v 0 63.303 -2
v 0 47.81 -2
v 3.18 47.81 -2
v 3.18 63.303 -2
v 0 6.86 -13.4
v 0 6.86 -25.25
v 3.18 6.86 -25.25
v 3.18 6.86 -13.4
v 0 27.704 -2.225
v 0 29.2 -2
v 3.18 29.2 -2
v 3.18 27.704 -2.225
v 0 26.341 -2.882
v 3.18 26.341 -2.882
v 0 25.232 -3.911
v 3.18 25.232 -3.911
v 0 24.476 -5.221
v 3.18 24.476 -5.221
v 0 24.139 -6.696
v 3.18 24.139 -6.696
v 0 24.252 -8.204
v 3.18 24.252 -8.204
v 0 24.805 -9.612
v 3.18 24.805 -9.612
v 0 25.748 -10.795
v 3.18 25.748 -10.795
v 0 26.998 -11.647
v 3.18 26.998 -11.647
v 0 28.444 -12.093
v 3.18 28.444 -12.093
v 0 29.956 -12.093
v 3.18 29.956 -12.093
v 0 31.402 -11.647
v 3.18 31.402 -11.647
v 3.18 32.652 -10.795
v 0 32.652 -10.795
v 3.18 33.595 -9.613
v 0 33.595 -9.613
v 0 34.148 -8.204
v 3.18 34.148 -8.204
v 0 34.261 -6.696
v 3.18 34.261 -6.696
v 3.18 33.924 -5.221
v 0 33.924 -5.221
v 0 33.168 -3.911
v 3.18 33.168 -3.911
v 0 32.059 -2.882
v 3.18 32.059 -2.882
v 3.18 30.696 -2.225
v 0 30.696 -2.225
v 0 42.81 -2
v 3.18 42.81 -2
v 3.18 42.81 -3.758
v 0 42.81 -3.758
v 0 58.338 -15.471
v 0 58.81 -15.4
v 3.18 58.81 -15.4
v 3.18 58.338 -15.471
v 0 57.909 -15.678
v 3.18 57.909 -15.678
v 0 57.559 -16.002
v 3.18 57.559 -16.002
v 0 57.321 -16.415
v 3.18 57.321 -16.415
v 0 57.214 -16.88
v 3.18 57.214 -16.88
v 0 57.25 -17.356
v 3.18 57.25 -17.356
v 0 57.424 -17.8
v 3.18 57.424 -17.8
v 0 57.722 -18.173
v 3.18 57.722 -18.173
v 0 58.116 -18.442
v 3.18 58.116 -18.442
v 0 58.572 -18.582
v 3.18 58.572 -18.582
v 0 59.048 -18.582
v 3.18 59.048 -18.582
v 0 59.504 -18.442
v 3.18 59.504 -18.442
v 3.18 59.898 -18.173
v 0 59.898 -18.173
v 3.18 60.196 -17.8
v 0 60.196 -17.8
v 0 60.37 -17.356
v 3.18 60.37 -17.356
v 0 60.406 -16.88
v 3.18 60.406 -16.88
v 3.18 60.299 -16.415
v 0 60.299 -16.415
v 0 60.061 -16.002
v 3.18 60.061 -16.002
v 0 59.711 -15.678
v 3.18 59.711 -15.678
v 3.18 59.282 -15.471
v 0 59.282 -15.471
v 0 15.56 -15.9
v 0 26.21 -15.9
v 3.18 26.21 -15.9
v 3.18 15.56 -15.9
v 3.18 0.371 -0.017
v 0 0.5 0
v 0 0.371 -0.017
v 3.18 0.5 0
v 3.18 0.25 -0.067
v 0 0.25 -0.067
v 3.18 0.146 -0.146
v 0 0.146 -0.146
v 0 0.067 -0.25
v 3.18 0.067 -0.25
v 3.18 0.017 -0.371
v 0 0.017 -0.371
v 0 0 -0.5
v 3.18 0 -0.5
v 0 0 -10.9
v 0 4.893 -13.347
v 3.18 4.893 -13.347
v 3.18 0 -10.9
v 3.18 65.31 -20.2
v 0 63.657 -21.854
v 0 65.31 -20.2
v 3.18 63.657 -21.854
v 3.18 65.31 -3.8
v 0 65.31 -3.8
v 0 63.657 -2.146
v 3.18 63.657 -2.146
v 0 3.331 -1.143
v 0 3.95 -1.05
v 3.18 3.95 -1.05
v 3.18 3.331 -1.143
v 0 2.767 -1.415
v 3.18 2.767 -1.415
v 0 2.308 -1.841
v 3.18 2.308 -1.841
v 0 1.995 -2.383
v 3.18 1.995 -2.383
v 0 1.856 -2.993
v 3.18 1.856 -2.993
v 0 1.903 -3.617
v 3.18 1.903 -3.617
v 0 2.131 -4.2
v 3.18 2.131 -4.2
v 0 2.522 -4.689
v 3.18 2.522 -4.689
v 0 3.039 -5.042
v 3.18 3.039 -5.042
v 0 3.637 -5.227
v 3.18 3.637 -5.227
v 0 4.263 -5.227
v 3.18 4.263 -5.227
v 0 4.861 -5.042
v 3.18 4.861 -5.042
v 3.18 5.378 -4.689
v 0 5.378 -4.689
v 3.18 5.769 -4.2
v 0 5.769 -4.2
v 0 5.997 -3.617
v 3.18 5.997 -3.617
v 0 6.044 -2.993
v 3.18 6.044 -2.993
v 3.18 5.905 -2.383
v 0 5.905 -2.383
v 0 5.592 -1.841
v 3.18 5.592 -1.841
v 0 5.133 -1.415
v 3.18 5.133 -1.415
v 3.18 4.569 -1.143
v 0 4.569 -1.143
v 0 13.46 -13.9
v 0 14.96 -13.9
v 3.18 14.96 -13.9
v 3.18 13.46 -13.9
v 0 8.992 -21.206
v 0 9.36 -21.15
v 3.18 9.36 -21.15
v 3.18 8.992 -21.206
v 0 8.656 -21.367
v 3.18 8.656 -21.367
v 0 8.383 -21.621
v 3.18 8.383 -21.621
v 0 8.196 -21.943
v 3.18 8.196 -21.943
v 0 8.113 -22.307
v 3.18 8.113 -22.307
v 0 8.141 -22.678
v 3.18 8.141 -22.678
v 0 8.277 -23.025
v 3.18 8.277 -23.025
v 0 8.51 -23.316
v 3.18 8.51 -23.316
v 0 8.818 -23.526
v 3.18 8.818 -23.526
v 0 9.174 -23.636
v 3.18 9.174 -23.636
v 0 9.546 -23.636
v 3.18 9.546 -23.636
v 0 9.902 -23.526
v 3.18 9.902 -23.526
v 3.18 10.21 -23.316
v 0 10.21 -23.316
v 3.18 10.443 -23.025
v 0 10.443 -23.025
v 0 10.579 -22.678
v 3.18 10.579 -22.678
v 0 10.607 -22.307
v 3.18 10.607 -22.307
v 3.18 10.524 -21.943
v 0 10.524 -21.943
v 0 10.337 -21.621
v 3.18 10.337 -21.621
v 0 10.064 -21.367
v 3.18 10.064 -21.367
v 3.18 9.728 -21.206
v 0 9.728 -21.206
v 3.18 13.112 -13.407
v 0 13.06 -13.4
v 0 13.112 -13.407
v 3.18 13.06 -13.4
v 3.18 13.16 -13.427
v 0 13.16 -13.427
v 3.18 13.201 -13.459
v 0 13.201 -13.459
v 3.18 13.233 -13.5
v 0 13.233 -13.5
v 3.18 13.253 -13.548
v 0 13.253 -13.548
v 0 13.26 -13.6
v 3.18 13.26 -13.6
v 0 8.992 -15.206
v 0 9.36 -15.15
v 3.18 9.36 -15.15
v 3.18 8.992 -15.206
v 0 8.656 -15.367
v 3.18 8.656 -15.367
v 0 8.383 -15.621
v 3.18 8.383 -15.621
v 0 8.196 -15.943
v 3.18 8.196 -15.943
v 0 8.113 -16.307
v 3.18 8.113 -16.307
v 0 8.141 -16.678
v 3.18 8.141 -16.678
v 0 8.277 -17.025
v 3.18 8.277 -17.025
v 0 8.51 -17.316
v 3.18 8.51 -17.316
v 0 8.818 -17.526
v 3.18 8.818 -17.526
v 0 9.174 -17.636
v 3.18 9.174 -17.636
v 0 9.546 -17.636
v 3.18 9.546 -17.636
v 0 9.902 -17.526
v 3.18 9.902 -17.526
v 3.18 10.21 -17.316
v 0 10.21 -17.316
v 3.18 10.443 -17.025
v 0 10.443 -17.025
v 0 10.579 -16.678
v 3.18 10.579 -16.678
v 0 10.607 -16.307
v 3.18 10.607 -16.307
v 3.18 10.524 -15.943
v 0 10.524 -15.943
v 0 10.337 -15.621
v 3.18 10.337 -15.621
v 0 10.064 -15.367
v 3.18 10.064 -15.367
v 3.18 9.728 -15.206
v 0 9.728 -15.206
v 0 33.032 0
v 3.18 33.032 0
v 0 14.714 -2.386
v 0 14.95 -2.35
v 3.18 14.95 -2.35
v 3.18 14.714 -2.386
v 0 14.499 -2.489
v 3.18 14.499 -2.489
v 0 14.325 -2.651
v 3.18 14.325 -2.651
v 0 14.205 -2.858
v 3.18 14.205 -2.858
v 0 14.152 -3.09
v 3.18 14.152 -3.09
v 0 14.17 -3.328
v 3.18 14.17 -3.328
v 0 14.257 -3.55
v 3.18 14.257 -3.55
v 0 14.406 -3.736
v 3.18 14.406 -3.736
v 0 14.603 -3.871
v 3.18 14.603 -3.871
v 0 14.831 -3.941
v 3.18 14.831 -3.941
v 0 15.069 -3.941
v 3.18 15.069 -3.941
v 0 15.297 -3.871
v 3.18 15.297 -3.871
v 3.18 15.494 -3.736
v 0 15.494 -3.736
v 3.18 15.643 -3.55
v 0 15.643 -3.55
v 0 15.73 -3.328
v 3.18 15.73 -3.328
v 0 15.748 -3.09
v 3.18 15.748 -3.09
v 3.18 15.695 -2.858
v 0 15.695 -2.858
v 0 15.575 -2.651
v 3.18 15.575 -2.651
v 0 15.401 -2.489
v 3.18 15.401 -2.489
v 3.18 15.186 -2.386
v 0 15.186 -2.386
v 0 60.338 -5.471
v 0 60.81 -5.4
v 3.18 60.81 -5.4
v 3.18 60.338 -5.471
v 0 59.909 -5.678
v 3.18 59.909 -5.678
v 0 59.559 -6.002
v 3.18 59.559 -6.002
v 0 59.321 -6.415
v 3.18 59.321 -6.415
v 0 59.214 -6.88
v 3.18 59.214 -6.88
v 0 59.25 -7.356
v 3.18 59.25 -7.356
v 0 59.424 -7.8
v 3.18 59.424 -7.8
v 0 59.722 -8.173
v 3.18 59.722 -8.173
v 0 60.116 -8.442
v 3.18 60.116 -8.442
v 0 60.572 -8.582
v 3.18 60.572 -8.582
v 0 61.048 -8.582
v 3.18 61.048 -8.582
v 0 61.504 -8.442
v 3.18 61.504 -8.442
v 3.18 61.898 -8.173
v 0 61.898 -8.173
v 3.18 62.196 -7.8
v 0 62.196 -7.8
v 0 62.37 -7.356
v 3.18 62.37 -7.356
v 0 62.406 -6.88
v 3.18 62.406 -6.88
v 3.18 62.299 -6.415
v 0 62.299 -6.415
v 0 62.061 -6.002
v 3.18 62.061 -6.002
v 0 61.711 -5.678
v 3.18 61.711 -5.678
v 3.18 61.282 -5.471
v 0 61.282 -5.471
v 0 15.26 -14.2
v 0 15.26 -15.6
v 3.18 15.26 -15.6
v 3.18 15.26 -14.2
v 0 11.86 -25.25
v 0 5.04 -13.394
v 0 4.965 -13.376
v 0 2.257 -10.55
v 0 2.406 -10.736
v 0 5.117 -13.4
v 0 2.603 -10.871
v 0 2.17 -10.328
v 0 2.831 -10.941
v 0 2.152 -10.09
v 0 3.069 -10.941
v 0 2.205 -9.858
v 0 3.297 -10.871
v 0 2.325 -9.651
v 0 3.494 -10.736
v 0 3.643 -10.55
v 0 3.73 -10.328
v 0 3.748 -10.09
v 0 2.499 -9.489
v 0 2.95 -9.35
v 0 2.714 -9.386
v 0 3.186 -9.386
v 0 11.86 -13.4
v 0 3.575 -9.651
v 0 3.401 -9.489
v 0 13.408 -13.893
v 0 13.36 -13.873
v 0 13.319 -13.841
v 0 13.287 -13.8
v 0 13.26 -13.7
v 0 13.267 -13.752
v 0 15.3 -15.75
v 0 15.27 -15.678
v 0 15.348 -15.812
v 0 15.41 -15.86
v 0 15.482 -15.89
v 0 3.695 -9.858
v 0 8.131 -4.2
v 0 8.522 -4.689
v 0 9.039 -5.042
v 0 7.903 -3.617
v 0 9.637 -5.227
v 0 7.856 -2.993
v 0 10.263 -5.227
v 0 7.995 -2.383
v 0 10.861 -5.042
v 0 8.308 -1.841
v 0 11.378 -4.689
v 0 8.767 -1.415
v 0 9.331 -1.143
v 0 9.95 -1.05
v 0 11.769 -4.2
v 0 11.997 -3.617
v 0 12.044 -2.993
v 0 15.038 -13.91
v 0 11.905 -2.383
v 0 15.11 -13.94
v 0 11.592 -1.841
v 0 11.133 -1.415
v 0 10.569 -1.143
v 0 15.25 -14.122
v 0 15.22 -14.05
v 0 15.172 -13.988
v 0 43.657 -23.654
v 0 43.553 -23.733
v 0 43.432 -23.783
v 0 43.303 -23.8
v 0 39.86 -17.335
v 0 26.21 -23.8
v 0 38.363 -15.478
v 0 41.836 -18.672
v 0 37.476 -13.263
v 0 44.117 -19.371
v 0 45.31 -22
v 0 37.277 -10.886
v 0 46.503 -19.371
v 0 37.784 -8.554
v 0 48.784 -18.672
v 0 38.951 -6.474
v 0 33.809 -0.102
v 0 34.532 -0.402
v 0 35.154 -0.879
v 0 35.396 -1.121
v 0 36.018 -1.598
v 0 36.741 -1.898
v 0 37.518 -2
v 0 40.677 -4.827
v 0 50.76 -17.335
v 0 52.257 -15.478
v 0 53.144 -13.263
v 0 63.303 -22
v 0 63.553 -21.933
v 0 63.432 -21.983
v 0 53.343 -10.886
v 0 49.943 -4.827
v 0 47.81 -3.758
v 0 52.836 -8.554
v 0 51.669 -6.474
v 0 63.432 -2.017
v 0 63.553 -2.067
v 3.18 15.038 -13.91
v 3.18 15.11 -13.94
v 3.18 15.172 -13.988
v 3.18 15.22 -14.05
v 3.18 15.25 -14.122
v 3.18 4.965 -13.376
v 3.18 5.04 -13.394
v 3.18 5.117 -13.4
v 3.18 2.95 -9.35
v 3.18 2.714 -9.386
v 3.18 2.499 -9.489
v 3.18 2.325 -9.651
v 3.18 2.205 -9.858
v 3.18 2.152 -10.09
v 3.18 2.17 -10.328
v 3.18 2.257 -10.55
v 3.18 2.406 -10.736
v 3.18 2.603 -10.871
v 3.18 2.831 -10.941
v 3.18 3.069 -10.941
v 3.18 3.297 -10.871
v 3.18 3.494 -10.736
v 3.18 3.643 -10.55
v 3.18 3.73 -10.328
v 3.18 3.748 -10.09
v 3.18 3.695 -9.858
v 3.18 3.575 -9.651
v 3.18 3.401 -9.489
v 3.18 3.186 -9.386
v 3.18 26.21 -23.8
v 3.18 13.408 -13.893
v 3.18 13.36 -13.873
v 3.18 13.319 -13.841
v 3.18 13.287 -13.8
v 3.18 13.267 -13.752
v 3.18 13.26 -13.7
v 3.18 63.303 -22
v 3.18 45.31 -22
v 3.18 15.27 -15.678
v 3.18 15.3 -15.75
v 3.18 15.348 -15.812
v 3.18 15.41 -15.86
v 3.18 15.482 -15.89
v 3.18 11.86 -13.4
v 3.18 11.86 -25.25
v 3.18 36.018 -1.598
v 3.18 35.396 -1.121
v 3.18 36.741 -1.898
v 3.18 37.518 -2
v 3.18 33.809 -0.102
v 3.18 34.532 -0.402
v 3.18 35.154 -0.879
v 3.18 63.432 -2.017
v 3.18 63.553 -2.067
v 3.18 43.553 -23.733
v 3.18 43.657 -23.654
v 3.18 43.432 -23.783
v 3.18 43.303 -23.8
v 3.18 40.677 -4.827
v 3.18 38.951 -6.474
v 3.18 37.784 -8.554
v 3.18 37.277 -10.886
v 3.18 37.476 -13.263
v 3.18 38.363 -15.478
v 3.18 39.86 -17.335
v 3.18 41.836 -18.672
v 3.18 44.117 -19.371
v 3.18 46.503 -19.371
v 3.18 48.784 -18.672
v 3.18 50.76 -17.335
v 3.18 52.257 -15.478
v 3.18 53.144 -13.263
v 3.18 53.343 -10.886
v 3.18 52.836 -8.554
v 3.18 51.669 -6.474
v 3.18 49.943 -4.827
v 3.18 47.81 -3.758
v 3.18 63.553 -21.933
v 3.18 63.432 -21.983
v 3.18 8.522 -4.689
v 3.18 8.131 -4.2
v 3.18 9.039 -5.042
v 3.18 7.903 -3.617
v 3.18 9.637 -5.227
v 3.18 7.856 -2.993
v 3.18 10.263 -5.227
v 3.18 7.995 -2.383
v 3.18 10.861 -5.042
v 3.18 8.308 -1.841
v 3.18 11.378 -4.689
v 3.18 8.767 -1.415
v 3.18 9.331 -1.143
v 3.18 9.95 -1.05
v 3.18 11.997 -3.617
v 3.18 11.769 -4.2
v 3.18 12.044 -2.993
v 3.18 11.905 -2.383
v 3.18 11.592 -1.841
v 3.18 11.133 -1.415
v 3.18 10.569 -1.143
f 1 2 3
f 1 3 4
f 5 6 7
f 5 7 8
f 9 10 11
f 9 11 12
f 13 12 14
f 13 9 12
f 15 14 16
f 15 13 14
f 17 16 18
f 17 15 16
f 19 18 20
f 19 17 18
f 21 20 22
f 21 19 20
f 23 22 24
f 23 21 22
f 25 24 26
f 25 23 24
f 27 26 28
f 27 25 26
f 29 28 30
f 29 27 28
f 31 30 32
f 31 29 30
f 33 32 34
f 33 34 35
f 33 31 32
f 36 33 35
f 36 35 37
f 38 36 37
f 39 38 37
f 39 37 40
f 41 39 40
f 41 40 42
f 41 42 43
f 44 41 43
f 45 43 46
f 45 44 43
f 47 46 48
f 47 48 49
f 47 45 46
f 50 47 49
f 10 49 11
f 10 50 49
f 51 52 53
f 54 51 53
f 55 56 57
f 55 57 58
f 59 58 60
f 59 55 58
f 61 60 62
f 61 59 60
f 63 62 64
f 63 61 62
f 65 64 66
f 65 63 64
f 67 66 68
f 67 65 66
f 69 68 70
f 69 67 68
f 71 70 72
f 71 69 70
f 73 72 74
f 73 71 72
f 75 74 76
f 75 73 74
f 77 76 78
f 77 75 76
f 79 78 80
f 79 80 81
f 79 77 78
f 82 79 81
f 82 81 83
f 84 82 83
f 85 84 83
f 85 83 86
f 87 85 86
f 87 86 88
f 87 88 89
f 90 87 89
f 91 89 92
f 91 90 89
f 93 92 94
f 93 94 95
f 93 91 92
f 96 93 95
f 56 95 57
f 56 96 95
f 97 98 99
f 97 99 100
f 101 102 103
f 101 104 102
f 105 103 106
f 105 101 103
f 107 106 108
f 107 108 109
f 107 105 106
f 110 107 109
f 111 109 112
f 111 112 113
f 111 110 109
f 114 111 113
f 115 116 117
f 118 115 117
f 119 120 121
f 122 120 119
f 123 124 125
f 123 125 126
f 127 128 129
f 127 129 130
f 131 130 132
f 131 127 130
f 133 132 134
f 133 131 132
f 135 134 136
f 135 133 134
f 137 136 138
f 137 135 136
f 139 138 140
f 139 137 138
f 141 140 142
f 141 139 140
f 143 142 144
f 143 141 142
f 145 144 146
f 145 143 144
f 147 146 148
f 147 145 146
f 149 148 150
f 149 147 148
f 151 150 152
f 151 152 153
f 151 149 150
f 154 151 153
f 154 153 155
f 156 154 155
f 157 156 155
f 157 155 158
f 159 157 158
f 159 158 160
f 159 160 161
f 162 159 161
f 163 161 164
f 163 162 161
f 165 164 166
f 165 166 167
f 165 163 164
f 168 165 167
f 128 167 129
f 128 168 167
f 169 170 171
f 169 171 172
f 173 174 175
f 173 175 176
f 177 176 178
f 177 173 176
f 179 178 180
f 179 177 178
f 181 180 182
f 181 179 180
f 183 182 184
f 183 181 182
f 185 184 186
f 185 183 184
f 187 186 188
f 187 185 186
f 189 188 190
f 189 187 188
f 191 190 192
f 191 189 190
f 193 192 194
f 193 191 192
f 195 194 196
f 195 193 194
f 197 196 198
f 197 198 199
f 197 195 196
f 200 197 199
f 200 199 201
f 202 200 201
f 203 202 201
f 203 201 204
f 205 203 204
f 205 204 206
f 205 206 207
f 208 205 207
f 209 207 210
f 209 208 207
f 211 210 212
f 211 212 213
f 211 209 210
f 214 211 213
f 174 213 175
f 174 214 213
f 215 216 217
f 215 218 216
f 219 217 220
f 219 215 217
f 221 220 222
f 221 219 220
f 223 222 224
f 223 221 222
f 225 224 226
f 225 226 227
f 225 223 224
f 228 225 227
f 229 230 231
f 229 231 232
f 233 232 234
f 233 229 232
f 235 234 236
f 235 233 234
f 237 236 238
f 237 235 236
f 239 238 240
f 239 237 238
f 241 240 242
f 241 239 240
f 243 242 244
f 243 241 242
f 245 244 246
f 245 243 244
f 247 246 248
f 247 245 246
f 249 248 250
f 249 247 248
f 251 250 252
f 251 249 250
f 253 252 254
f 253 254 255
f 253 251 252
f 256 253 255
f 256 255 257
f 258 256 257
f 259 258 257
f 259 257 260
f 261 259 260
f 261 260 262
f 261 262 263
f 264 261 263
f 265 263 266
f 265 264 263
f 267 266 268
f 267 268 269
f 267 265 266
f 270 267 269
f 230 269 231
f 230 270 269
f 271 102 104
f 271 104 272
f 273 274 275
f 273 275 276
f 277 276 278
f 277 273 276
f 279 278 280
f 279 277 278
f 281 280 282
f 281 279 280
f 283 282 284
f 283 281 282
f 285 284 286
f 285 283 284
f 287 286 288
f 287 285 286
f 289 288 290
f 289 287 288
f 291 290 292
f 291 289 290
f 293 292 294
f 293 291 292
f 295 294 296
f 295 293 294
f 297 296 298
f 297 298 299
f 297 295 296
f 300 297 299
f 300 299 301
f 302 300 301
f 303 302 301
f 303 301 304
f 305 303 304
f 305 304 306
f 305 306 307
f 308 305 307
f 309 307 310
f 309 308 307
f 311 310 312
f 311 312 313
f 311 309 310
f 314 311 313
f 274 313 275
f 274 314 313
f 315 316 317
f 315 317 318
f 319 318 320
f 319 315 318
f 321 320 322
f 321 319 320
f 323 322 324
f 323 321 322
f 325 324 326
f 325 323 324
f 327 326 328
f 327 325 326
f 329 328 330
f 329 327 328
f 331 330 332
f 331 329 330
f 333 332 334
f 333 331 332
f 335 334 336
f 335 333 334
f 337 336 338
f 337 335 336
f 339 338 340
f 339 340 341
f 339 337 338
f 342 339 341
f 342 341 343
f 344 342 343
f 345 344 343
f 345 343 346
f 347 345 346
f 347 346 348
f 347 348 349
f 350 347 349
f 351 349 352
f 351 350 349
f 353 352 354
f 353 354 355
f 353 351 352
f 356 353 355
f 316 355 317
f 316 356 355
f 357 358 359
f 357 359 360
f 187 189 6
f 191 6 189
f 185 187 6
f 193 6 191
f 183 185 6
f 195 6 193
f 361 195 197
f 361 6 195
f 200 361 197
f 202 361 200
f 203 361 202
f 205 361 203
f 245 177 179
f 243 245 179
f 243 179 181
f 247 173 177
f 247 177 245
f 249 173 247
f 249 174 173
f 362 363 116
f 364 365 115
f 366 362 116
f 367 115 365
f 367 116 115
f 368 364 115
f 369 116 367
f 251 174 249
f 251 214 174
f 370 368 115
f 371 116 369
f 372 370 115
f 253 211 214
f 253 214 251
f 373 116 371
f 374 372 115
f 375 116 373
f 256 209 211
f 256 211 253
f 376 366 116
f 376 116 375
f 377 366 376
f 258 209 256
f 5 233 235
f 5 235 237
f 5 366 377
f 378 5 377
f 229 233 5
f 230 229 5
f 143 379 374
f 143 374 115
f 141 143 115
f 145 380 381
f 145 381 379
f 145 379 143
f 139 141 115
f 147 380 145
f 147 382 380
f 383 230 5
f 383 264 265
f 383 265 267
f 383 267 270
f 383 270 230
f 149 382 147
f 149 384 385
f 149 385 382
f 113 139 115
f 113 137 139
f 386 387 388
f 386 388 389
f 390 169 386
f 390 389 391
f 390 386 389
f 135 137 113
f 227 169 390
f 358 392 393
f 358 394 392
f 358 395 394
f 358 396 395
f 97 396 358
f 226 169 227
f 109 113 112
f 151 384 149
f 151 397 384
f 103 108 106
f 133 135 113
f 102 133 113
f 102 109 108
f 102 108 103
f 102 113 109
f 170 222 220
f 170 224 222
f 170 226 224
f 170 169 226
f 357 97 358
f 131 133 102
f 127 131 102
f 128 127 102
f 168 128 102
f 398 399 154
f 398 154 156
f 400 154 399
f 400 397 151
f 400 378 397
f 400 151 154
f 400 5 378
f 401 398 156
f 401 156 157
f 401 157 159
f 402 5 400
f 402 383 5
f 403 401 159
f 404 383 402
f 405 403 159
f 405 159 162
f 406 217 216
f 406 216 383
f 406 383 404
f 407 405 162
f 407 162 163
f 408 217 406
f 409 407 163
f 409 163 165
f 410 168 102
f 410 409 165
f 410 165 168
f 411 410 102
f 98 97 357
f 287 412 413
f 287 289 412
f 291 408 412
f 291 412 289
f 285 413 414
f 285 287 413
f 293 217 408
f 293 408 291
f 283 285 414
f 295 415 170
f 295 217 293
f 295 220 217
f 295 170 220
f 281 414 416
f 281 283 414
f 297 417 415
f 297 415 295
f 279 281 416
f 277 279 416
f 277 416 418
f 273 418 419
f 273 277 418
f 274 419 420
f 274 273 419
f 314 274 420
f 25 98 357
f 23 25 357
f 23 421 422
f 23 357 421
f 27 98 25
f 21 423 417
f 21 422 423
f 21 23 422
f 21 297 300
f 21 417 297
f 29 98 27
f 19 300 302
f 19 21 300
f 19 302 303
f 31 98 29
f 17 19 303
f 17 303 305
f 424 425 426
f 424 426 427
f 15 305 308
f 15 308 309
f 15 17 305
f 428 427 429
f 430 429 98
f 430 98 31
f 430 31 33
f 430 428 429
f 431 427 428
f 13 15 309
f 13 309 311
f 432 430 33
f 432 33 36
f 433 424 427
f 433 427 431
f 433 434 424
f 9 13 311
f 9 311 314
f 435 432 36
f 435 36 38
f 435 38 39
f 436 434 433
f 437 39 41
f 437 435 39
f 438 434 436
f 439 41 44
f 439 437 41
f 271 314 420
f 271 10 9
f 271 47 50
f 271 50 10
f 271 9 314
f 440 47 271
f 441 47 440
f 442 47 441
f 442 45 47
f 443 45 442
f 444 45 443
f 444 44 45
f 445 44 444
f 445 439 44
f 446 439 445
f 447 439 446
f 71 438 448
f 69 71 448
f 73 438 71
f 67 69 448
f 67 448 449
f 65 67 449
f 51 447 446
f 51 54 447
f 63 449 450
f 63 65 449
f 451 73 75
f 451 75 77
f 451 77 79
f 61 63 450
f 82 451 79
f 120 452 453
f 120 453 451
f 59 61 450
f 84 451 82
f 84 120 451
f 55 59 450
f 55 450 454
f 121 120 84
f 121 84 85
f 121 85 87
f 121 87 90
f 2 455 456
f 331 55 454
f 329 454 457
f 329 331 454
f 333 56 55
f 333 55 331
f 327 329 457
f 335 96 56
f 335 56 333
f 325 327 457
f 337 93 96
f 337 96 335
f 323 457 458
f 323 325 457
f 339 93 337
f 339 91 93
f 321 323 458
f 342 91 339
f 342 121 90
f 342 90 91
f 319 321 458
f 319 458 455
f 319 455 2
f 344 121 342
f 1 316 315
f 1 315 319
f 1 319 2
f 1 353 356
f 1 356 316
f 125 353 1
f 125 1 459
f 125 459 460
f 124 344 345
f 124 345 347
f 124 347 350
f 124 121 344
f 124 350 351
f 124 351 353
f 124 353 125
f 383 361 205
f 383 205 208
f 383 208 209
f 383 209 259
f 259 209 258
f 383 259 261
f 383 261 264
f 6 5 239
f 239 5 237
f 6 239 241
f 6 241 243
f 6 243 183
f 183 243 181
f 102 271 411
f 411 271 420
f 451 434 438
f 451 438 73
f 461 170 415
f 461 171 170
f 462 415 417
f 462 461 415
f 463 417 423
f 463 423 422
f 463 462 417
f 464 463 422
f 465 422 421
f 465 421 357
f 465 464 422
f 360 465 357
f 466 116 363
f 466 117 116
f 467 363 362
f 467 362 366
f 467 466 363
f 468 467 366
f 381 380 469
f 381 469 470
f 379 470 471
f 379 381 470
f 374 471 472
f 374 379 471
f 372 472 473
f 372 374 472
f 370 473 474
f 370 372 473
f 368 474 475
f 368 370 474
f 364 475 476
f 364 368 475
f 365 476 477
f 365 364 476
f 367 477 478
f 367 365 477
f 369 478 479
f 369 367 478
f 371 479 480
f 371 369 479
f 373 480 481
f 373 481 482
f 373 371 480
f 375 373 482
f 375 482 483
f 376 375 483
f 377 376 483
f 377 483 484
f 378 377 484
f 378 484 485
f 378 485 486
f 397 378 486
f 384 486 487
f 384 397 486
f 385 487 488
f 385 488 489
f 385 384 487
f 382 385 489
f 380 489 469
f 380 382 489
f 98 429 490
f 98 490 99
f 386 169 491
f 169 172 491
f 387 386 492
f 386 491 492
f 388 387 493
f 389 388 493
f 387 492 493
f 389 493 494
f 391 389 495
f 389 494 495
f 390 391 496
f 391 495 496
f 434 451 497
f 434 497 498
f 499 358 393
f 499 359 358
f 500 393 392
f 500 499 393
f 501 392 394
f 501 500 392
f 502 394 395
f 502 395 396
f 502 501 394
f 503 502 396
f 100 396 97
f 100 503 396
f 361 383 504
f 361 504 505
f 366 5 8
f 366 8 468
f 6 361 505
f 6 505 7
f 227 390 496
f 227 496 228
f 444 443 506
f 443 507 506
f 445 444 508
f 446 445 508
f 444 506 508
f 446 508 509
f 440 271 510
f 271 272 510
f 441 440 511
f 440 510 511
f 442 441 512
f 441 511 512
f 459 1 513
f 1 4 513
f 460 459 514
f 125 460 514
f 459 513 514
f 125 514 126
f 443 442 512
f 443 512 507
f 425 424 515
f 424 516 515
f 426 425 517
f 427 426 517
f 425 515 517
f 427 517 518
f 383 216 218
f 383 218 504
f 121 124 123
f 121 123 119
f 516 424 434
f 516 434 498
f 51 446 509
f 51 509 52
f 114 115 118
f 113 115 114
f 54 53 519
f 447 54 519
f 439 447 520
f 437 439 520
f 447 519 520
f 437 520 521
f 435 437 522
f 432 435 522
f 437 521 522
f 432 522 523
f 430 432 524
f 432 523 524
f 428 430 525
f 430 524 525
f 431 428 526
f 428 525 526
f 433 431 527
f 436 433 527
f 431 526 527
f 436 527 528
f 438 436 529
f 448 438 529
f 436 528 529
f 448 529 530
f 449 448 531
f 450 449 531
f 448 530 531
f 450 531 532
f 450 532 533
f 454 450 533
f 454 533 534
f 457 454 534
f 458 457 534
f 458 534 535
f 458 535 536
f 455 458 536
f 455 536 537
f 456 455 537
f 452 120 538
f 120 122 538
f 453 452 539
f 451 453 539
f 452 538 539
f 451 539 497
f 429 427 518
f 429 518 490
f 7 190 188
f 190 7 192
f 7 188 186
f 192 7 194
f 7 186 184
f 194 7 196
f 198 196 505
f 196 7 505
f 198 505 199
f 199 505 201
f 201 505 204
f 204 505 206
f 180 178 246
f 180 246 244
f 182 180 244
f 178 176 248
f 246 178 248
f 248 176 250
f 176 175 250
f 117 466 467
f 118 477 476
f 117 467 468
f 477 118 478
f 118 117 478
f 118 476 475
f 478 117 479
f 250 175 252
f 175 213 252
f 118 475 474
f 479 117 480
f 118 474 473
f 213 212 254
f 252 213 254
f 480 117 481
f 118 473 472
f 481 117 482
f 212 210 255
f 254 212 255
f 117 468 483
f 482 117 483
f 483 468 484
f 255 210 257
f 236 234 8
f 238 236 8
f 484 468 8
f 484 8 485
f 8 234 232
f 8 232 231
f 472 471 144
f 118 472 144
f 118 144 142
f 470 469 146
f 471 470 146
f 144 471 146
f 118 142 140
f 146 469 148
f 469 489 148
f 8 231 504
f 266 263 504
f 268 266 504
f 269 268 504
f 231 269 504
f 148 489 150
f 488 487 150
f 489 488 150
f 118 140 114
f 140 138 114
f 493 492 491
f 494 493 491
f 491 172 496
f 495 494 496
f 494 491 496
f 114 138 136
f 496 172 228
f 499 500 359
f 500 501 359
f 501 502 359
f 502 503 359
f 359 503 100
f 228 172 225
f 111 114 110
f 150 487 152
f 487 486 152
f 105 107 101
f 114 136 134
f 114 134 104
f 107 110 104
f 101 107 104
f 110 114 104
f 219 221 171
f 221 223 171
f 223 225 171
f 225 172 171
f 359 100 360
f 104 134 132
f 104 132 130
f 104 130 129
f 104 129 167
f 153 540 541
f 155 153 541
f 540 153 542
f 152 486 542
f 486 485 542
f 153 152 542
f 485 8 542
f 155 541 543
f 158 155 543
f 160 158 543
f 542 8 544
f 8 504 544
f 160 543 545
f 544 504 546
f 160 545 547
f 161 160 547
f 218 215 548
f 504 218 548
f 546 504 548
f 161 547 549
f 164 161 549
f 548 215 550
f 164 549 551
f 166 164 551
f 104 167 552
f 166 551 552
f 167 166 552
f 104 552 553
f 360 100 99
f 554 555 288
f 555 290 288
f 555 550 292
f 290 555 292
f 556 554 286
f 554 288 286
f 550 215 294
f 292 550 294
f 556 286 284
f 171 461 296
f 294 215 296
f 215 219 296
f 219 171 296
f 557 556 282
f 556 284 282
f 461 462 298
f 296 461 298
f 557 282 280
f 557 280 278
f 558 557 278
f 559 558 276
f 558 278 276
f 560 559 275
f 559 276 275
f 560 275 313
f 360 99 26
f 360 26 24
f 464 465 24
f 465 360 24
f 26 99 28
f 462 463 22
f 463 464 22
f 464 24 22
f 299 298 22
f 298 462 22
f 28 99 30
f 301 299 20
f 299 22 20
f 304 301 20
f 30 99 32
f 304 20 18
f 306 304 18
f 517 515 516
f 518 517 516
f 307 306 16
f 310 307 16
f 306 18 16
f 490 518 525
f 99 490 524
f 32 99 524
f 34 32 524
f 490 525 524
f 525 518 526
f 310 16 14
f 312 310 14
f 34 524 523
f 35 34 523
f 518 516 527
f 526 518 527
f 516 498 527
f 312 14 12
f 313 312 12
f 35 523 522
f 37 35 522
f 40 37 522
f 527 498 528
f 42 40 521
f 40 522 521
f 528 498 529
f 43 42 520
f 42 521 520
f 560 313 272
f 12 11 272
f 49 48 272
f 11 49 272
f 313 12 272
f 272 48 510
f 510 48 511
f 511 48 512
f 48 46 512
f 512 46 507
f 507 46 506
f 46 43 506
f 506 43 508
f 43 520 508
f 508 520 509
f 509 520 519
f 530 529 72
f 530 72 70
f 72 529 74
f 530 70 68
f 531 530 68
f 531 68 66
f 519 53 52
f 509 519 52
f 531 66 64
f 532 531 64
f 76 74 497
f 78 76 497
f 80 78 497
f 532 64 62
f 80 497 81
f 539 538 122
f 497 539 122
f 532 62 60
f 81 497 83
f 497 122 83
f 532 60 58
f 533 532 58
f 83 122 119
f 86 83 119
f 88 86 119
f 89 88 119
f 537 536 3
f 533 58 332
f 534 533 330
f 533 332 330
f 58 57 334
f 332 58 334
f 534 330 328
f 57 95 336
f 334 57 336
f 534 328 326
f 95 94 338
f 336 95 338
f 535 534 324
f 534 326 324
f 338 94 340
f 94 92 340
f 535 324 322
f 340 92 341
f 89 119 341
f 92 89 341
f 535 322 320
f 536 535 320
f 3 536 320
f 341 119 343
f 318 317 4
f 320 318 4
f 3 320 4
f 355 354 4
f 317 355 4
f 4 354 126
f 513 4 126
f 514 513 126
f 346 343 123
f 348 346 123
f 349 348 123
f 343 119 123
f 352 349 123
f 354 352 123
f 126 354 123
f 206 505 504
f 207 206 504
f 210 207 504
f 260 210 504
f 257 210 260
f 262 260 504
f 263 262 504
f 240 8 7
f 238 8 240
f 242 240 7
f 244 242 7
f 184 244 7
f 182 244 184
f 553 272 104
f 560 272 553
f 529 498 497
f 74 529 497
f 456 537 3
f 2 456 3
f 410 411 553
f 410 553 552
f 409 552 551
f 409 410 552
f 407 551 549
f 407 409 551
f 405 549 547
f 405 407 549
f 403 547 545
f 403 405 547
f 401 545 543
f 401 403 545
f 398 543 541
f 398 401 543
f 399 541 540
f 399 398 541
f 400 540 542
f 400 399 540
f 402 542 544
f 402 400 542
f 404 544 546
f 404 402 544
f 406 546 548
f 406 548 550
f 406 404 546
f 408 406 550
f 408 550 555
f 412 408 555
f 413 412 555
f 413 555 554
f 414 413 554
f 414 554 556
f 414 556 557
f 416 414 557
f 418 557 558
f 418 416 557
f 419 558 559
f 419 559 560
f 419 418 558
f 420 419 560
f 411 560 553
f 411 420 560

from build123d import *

# Parameters (mm, degrees)
SKETCH1_R             = 5.075
SKETCH1_R_2           = 1.6
SKETCH1_R_3           = 1.25
SKETCH1_R_4           = 2.1
SKETCH1_R_5           = 0.8
BOSS_EXTRUDE1_DEPTH   = 3.18
CHAMFER1_SIZE         = 2.5
CHAMFER1_SIZE2        = 4.998920521
FILLET2_R             = 3
CHAMFER2_SIZE         = 1.8
FILLET4_R             = 0.5
FILLET7_R             = 0.2
M3X0_5_TAPPED_HOLE1_D = 2.5
M2_TAPPED_HOLE1_D     = 1.6
FILLET8_R             = 0.3
CUT_EXTRUDE5_DEPTH    = 4


with BuildPart() as part:
    # Sketch1 → Boss-Extrude1 (new body)
    with BuildSketch(Plane(origin=(0, 0, 0), x_dir=(0, 0, -1), z_dir=(1, 0, 0))):
        Polygon((0, 0), (0, 34.275), (2, 36.275), (2, 65.31), (22, 65.31), (22, 45.31), (23.8, 45.31), (23.8, 26.21), (15.9, 26.21), (15.9, 15.26), (13.9, 15.26), (13.9, 13.26), (13.4, 13.26), (13.4, 11.86), (25.25, 11.86), (25.25, 6.86), (13.4, 6.86), (13.4, 0), align=None)
        with Locations(Location((7.075, 29.2, 0), (0, 0, 180))):
            Circle(SKETCH1_R, mode=Mode.SUBTRACT)
        with Locations(Location((7, 60.81, 0), (0, 0, 180))):
            Circle(SKETCH1_R_2, mode=Mode.SUBTRACT)
        with Locations(Location((17, 58.81, 0), (0, 0, 180))):
            Circle(SKETCH1_R_2, mode=Mode.SUBTRACT)
        with Locations(Location((22.4, 9.36, 0), (0, 0, 180))):
            Circle(SKETCH1_R_3, mode=Mode.SUBTRACT)
        with Locations(Location((16.4, 9.36, 0), (0, 0, 180))):
            Circle(SKETCH1_R_3, mode=Mode.SUBTRACT)
        with Locations(Location((3.15, 3.95, 0), (0, 0, 180))):
            Circle(SKETCH1_R_4, mode=Mode.SUBTRACT)
        with Locations(Location((3.15, 9.95, 0), (0, 0, 180))):
            Circle(SKETCH1_R_4, mode=Mode.SUBTRACT)
        with Locations(Location((10.15, 2.95, 0), (0, 0, 180))):
            Circle(SKETCH1_R_5, mode=Mode.SUBTRACT)
        with Locations(Location((3.15, 14.95, 0), (0, 0, 180))):
            Circle(SKETCH1_R_5, mode=Mode.SUBTRACT)
    extrude(amount=BOSS_EXTRUDE1_DEPTH)

    # Chamfer1
    chamfer1_edges = [part.edges().sort_by_distance(p)[0] for p in [
        (1.59, 0, -13.4),
    ]]
    chamfer1_side = [part.faces().sort_by_distance(p)[0] for p in [
        (1.59, 0, -6.7),
    ]]
    chamfer(chamfer1_edges, length=CHAMFER1_SIZE, length2=CHAMFER1_SIZE2, reference=chamfer1_side[0])

    # Fillet2
    fillet2_edges = [part.edges().sort_by_distance(p)[0] for p in [
        (1.59, 34.275, 0),
        (1.59, 36.275, -2),
    ]]
    fillet(fillet2_edges, radius=FILLET2_R)

    # Chamfer2
    chamfer2_edges = [part.edges().sort_by_distance(p)[0] for p in [
        (1.59, 65.31, -22),
        (1.59, 65.31, -2),
        (1.59, 45.31, -23.8),
    ]]
    chamfer(chamfer2_edges, length=CHAMFER2_SIZE - 0.0001)  # a hair under: the kernel refuses the full size

    # Fillet4
    fillet4_edges = [part.edges().sort_by_distance(p)[0] for p in [
        (1.59, 43.5101, -23.8),
        (1.59, 63.5101, -22),
        (1.59, 63.5101, -2),
        (1.59, 0, 0),
        (1.59, 4.998920521, -13.4),
    ]]
    fillet(fillet4_edges, radius=FILLET4_R)

    # Fillet7
    fillet7_edges = [part.edges().sort_by_distance(p)[0] for p in [
        (1.59, 13.26, -13.9),
        (1.59, 13.26, -13.4),
    ]]
    fillet(fillet7_edges, radius=FILLET7_R)

    # M3x0.5 Tapped Hole1 (through all)
    with Locations(Plane(origin=(3.18, 0, 0), x_dir=(0, 0, -1), z_dir=(1, 0, 0))):
        with Locations((16.4, 9.36), (22.4, 9.36)):
            Hole(M3X0_5_TAPPED_HOLE1_D / 2)

    # M2 Tapped Hole1 (through all)
    with Locations(Plane(origin=(0, 14.95, -3.15), x_dir=(0, 0, -1), z_dir=(-1, 0, 0))):
        with Locations((0, 0), (7, 12)):
            Hole(M2_TAPPED_HOLE1_D / 2)

    # Fillet8
    fillet8_edges = [part.edges().sort_by_distance(p)[0] for p in [
        (1.59, 15.26, -15.9),
        (1.59, 15.26, -13.9),
    ]]
    fillet(fillet8_edges, radius=FILLET8_R)

    # Sketch13 → Cut-Extrude5 (cut)
    with BuildSketch(Plane(origin=(3.18, 0, 0), x_dir=(0, 0, -1), z_dir=(1, 0, 0))):
        with BuildLine():
            Line((2, 42.81), (3.758141467, 42.81))
            ThreePointArc((3.758141467, 42.81), (19.460102, 45.31), (3.758141467, 47.81))
            Line((3.758141467, 47.81), (2, 47.81))
            Line((2, 47.81), (2, 42.81))
        make_face()
    extrude(amount=-CUT_EXTRUDE5_DEPTH, mode=Mode.SUBTRACT)


solid = part.part
